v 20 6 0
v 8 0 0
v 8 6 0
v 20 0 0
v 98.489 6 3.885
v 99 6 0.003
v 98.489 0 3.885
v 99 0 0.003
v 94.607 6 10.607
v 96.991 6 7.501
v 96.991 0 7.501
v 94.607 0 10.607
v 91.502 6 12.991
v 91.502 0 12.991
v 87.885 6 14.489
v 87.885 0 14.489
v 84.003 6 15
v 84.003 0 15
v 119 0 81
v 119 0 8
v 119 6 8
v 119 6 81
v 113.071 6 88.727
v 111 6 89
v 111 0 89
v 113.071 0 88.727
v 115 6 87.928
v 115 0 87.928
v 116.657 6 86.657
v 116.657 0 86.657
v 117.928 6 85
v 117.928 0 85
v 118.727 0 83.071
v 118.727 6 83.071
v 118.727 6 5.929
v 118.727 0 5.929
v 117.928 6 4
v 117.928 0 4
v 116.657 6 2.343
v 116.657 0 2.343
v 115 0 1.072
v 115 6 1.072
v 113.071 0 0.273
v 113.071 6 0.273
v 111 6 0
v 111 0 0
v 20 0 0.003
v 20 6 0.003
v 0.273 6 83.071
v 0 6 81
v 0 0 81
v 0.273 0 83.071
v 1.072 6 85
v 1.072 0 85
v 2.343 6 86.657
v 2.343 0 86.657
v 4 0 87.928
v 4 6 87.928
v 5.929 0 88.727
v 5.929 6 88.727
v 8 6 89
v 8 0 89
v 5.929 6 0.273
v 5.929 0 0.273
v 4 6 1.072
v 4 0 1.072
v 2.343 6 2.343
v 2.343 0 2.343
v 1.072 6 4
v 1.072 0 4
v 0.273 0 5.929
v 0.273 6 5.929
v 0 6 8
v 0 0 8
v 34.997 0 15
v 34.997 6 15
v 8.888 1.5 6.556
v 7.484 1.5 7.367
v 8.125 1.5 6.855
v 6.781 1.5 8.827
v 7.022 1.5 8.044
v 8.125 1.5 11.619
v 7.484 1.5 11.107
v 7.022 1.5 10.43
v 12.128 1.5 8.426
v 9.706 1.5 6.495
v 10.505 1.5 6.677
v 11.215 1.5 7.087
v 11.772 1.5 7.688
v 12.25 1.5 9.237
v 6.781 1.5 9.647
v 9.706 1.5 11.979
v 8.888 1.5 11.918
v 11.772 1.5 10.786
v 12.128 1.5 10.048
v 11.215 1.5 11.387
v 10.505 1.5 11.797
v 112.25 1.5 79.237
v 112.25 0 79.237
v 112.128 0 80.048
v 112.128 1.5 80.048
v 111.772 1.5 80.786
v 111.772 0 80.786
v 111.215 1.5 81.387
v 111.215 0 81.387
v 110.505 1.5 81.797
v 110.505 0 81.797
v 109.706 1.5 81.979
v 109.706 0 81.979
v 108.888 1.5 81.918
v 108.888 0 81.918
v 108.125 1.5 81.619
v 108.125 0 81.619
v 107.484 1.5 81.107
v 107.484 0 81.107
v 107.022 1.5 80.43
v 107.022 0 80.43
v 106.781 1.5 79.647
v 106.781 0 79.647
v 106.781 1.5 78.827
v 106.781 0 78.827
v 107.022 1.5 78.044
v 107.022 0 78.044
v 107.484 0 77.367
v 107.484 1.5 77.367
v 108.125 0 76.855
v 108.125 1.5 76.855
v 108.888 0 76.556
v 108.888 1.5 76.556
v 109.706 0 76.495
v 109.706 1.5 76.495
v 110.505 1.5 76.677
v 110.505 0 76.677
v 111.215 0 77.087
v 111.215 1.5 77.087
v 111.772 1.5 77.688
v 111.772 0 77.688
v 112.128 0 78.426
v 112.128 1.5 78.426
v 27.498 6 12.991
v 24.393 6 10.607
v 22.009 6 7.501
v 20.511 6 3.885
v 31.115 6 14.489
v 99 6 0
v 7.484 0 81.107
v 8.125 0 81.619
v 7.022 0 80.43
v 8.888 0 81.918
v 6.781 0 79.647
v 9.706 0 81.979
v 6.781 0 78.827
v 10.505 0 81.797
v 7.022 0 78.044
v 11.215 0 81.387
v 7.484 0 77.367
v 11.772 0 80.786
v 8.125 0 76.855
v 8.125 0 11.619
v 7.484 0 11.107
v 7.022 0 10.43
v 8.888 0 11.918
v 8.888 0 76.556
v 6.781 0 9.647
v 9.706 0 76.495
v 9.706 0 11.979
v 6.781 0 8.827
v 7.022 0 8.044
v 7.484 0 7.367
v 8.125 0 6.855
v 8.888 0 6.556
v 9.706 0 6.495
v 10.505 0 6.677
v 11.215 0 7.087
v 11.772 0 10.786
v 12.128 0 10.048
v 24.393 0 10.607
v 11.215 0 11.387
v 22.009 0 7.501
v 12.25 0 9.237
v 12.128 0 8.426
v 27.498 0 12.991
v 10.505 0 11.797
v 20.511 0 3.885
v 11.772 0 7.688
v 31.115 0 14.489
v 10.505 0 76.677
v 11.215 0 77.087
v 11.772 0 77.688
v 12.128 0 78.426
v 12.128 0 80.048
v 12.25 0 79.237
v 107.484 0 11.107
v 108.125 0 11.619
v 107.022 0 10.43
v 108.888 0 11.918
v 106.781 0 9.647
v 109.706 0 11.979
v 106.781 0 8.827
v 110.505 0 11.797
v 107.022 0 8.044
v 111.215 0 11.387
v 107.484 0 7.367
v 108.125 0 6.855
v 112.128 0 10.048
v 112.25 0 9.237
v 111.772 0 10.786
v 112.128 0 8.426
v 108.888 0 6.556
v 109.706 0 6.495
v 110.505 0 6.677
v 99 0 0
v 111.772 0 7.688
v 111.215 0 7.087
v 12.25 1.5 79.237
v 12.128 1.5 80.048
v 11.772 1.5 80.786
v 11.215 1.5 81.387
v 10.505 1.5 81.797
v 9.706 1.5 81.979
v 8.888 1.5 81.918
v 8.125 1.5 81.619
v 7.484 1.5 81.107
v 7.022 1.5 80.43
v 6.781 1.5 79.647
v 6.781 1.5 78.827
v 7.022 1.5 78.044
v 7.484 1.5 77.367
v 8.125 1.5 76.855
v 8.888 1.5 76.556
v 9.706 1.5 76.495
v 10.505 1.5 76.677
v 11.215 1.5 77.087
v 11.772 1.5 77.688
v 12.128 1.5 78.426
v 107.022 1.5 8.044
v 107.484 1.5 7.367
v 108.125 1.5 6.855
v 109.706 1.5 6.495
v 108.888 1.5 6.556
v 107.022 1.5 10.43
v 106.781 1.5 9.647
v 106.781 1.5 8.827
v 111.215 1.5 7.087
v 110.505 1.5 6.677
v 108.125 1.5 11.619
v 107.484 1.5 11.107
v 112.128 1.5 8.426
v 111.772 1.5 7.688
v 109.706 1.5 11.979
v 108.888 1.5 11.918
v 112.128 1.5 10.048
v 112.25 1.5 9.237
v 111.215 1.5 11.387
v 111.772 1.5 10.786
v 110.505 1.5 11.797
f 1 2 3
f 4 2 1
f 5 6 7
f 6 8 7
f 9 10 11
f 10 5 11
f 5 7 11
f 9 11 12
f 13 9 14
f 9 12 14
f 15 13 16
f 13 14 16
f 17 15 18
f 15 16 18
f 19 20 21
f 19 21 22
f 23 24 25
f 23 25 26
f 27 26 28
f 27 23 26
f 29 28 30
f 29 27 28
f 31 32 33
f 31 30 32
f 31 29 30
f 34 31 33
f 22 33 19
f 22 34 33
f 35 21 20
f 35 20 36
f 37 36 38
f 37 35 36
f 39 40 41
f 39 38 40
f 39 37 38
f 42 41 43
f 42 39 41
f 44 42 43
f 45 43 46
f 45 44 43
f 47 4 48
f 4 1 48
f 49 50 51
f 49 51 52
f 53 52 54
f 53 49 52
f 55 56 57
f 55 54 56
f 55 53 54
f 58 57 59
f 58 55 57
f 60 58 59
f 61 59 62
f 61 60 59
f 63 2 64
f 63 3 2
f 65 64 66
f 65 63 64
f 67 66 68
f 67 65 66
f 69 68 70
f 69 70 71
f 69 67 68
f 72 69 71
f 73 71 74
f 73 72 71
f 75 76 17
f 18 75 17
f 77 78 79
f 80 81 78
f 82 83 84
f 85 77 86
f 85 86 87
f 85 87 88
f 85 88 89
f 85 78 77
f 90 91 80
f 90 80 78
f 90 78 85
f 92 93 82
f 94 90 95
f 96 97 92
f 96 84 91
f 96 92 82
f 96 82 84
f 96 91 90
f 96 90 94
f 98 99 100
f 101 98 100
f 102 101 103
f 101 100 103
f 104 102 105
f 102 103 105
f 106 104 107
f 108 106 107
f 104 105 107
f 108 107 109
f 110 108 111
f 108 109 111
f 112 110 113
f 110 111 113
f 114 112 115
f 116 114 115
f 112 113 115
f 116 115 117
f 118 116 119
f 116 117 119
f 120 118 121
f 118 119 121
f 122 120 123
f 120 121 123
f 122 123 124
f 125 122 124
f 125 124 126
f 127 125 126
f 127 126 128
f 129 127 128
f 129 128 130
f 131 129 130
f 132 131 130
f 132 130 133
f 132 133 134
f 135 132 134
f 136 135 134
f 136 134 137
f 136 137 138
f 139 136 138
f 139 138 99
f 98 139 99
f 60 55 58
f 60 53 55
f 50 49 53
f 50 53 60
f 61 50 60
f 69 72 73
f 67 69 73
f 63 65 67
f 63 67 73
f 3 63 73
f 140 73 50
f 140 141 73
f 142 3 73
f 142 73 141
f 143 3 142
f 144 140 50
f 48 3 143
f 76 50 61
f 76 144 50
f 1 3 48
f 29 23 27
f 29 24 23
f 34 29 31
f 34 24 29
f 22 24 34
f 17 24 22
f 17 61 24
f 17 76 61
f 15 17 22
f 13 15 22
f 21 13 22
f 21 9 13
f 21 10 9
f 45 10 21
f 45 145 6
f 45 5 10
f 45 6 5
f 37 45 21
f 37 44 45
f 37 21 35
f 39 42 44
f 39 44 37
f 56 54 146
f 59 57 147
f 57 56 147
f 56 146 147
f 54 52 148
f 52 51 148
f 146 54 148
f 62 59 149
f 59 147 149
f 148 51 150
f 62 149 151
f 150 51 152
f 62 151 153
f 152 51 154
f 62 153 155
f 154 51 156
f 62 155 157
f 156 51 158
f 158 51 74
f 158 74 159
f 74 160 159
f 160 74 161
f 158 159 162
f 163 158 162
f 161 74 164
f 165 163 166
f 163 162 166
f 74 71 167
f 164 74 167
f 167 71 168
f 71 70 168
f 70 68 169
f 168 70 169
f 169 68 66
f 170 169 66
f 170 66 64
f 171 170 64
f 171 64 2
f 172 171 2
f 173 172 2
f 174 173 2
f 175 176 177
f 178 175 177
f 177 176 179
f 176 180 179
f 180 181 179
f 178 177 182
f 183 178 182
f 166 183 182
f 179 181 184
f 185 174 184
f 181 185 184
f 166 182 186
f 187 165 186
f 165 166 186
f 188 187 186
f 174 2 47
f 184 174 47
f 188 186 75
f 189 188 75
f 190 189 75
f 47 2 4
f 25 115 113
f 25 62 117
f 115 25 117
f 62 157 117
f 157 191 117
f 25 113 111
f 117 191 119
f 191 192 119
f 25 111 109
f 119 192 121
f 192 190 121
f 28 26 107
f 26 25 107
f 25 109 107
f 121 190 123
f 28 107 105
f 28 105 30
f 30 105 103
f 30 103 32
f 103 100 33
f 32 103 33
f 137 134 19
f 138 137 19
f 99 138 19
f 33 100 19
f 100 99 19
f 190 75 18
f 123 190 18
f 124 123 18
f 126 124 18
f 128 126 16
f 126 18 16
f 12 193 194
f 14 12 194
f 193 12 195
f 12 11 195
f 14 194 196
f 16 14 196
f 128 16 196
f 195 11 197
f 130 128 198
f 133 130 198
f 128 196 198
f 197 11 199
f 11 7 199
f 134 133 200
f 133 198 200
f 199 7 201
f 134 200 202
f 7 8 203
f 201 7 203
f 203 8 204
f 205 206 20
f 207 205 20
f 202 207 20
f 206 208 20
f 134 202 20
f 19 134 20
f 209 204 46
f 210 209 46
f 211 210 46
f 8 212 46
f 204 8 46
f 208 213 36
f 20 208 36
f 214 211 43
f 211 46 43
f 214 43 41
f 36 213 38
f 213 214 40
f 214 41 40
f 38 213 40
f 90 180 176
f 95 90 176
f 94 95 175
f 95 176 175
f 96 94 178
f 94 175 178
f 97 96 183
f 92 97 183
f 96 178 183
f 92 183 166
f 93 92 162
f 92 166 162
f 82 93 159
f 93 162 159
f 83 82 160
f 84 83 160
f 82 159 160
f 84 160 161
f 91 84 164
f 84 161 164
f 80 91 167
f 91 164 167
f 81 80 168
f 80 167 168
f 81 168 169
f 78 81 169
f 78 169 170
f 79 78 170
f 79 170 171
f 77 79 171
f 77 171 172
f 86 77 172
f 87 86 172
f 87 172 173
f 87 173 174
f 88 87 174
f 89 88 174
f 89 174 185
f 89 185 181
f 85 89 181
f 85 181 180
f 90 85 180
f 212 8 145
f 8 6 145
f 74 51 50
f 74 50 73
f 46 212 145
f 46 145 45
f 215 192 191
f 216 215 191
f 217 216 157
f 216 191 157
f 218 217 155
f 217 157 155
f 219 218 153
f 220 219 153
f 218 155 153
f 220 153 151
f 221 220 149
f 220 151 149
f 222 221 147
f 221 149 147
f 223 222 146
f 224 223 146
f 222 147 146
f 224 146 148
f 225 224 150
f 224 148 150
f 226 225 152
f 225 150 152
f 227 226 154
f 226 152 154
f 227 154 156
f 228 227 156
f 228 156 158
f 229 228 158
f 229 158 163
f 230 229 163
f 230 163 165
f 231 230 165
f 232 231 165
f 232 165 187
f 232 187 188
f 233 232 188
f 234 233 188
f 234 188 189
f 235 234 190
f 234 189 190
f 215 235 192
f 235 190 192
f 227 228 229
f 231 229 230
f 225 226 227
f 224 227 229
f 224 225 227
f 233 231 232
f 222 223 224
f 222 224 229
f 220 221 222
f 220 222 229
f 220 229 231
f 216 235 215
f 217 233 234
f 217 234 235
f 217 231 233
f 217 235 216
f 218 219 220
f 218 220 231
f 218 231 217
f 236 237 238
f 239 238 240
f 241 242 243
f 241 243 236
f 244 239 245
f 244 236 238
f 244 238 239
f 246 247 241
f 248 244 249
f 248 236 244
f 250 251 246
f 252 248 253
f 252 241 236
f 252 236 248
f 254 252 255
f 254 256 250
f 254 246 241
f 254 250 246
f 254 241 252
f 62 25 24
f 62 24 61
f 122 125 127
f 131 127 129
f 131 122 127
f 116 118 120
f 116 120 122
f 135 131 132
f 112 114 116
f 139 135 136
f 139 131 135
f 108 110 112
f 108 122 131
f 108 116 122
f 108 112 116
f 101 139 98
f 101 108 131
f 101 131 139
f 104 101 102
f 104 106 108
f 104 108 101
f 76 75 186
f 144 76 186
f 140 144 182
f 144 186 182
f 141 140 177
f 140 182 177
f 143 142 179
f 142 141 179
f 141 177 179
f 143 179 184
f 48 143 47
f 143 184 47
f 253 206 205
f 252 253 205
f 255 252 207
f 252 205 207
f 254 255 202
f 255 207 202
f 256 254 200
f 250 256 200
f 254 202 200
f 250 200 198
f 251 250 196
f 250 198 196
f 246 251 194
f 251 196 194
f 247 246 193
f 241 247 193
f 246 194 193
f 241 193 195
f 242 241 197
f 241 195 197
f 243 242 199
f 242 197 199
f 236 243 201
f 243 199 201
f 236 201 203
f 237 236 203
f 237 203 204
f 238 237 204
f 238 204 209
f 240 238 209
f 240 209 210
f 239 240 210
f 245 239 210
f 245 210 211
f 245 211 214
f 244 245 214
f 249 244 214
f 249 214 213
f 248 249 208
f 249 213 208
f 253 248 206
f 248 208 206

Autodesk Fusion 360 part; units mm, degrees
sketch "Top Access Panel" plane through (0, 0, 0) normal (0, 1, 0) x (1, 0, 0)
  line L0 (0, 0) -> (119, 0)
  line L1 (119, 0) -> (119, -89)
  line L2 (119, -89) -> (0, -89)
  line L3 (0, -89) -> (0, 0)
  dimension "d1" = 119
  dimension "d2" = 89
extrude "Extrude1" add sketch "Top Access Panel" along normal blind 6
fillet "Fillet1" radius 8 4 edges at (0, 3, 89) (119, 3, 89) (119, 3, 0) (0, 3, 0)
sketch "Handle" plane through (0, 6, 0) normal (0, 1, 0) x (-1, 0, 0)
  arc A0 (-8, 0) -> (0, 8) centre (-8, 8) ccw
  line L0 (0, 8) -> (0, 81)
  arc A1 (0, 81) -> (-8, 89) centre (-8, 81) ccw
  line L1 (-8, 89) -> (-111, 89)
  arc A2 (-111, 89) -> (-119, 81) centre (-111, 81) ccw
  line L2 (-119, 81) -> (-119, 8)
  arc A3 (-119, 8) -> (-111, 0) centre (-111, 8) ccw
  line L3 (-111, 0) -> (-8, 0)
  line L4 (-99, 0) -> (-20, 0)
  line L5 (-20, 0) -> (-20, 15)
  line L6 (-20, 15) -> (-99, 15)
  line L7 (-99, 15) -> (-99, 0)
  dimension "d16" = 15
  dimension "d17" = 20
  dimension "d18" = 20
extrude "Extrude3" cut sketch "Handle" against normal blind 6 contours L3 L4 L5 L6 L7
fillet "Fillet2" radius 15 2 edges at (99, 3, 15) (20, 3, 15)
sketch "Sketch4" plane through (0, 0, 0) normal (0, -1, 0) x (1, 0, 0)
  line L0 (35, 15) -> (84, 15)
  arc A0 (99, 0) -> (84, 15) centre (84, 0) ccw
  line L1 (99, 0) -> (111, 0)
  arc A1 (111, 0) -> (119, 8) centre (111, 8) ccw
  line L2 (119, 8) -> (119, 81)
  arc A2 (119, 81) -> (111, 89) centre (111, 81) ccw
  line L3 (111, 89) -> (8, 89)
  arc A3 (8, 89) -> (0, 81) centre (8, 81) ccw
  line L4 (0, 81) -> (0, 8)
  arc A4 (0, 8) -> (8, 0) centre (8, 8) ccw
  line L5 (8, 0) -> (20, 0)
  arc A5 (35, 15) -> (20, 0) centre (35, 0) ccw
  circle A6 centre (9.5, 79.237) radius 2.75
  circle A7 centre (109.5, 79.237) radius 2.75
  circle A8 centre (9.5, 9.237) radius 2.75
  circle A9 centre (109.5, 9.237) radius 2.75
  dimension "d23" = 5.5
  dimension "d24" = 5.5
  dimension "d25" = 5.5
  dimension "d26" = 5.5
  dimension "d27" = 9.5
  dimension "d28" = 9.5
  dimension "d29" = 9.5
  dimension "d30" = 9.5
  dimension "d31" = 9.763
  dimension "d32" = 9.763
  dimension "d33" = 9.237
  dimension "d34" = 9.237
extrude "Extrude4" cut sketch "Sketch4" against normal blind 1.5 contours A6 | A7 | A8 | A9
equation "mdfThickness = 6 mm" comment "Thickness of the MDF fibre board"
equation "d4 = mdfThickness"
equation "filletRadius = 8 mm" comment "Radius to use for fillets"
equation "d15 = filletRadius"
equation "d19 = -mdfThickness"
equation "d27 = 7.5 mm + ( ( 5.5 / 2 ) * 1 mm ) - 0.25 mm - 0.5 mm"
equation "d28 = 7.5 mm + ( ( 5.5 / 2 ) * 1 mm ) - 0.25 mm - 0.5 mm"
equation "d29 = 7.5 mm + ( ( 5.5 / 2 ) * 1 mm ) - 0.25 mm - 0.5 mm"
equation "d30 = 7.5 mm + ( ( 5.5 / 2 ) * 1 mm ) - 0.25 mm - 0.5 mm"
equation "d31 = 7.763 mm + ( ( 5.5 / 2 ) * 1 mm ) - 0.25 mm - 0.5 mm"
equation "d32 = 7.763 mm + ( ( 5.5 / 2 ) * 1 mm ) - 0.25 mm - 0.5 mm"
equation "d33 = 7.237 mm + ( ( 5.5 / 2 ) * 1 mm ) - 0.25 mm - 0.5 mm"
equation "d34 = 7.237 mm + ( ( 5.5 / 2 ) * 1 mm ) - 0.25 mm - 0.5 mm"
